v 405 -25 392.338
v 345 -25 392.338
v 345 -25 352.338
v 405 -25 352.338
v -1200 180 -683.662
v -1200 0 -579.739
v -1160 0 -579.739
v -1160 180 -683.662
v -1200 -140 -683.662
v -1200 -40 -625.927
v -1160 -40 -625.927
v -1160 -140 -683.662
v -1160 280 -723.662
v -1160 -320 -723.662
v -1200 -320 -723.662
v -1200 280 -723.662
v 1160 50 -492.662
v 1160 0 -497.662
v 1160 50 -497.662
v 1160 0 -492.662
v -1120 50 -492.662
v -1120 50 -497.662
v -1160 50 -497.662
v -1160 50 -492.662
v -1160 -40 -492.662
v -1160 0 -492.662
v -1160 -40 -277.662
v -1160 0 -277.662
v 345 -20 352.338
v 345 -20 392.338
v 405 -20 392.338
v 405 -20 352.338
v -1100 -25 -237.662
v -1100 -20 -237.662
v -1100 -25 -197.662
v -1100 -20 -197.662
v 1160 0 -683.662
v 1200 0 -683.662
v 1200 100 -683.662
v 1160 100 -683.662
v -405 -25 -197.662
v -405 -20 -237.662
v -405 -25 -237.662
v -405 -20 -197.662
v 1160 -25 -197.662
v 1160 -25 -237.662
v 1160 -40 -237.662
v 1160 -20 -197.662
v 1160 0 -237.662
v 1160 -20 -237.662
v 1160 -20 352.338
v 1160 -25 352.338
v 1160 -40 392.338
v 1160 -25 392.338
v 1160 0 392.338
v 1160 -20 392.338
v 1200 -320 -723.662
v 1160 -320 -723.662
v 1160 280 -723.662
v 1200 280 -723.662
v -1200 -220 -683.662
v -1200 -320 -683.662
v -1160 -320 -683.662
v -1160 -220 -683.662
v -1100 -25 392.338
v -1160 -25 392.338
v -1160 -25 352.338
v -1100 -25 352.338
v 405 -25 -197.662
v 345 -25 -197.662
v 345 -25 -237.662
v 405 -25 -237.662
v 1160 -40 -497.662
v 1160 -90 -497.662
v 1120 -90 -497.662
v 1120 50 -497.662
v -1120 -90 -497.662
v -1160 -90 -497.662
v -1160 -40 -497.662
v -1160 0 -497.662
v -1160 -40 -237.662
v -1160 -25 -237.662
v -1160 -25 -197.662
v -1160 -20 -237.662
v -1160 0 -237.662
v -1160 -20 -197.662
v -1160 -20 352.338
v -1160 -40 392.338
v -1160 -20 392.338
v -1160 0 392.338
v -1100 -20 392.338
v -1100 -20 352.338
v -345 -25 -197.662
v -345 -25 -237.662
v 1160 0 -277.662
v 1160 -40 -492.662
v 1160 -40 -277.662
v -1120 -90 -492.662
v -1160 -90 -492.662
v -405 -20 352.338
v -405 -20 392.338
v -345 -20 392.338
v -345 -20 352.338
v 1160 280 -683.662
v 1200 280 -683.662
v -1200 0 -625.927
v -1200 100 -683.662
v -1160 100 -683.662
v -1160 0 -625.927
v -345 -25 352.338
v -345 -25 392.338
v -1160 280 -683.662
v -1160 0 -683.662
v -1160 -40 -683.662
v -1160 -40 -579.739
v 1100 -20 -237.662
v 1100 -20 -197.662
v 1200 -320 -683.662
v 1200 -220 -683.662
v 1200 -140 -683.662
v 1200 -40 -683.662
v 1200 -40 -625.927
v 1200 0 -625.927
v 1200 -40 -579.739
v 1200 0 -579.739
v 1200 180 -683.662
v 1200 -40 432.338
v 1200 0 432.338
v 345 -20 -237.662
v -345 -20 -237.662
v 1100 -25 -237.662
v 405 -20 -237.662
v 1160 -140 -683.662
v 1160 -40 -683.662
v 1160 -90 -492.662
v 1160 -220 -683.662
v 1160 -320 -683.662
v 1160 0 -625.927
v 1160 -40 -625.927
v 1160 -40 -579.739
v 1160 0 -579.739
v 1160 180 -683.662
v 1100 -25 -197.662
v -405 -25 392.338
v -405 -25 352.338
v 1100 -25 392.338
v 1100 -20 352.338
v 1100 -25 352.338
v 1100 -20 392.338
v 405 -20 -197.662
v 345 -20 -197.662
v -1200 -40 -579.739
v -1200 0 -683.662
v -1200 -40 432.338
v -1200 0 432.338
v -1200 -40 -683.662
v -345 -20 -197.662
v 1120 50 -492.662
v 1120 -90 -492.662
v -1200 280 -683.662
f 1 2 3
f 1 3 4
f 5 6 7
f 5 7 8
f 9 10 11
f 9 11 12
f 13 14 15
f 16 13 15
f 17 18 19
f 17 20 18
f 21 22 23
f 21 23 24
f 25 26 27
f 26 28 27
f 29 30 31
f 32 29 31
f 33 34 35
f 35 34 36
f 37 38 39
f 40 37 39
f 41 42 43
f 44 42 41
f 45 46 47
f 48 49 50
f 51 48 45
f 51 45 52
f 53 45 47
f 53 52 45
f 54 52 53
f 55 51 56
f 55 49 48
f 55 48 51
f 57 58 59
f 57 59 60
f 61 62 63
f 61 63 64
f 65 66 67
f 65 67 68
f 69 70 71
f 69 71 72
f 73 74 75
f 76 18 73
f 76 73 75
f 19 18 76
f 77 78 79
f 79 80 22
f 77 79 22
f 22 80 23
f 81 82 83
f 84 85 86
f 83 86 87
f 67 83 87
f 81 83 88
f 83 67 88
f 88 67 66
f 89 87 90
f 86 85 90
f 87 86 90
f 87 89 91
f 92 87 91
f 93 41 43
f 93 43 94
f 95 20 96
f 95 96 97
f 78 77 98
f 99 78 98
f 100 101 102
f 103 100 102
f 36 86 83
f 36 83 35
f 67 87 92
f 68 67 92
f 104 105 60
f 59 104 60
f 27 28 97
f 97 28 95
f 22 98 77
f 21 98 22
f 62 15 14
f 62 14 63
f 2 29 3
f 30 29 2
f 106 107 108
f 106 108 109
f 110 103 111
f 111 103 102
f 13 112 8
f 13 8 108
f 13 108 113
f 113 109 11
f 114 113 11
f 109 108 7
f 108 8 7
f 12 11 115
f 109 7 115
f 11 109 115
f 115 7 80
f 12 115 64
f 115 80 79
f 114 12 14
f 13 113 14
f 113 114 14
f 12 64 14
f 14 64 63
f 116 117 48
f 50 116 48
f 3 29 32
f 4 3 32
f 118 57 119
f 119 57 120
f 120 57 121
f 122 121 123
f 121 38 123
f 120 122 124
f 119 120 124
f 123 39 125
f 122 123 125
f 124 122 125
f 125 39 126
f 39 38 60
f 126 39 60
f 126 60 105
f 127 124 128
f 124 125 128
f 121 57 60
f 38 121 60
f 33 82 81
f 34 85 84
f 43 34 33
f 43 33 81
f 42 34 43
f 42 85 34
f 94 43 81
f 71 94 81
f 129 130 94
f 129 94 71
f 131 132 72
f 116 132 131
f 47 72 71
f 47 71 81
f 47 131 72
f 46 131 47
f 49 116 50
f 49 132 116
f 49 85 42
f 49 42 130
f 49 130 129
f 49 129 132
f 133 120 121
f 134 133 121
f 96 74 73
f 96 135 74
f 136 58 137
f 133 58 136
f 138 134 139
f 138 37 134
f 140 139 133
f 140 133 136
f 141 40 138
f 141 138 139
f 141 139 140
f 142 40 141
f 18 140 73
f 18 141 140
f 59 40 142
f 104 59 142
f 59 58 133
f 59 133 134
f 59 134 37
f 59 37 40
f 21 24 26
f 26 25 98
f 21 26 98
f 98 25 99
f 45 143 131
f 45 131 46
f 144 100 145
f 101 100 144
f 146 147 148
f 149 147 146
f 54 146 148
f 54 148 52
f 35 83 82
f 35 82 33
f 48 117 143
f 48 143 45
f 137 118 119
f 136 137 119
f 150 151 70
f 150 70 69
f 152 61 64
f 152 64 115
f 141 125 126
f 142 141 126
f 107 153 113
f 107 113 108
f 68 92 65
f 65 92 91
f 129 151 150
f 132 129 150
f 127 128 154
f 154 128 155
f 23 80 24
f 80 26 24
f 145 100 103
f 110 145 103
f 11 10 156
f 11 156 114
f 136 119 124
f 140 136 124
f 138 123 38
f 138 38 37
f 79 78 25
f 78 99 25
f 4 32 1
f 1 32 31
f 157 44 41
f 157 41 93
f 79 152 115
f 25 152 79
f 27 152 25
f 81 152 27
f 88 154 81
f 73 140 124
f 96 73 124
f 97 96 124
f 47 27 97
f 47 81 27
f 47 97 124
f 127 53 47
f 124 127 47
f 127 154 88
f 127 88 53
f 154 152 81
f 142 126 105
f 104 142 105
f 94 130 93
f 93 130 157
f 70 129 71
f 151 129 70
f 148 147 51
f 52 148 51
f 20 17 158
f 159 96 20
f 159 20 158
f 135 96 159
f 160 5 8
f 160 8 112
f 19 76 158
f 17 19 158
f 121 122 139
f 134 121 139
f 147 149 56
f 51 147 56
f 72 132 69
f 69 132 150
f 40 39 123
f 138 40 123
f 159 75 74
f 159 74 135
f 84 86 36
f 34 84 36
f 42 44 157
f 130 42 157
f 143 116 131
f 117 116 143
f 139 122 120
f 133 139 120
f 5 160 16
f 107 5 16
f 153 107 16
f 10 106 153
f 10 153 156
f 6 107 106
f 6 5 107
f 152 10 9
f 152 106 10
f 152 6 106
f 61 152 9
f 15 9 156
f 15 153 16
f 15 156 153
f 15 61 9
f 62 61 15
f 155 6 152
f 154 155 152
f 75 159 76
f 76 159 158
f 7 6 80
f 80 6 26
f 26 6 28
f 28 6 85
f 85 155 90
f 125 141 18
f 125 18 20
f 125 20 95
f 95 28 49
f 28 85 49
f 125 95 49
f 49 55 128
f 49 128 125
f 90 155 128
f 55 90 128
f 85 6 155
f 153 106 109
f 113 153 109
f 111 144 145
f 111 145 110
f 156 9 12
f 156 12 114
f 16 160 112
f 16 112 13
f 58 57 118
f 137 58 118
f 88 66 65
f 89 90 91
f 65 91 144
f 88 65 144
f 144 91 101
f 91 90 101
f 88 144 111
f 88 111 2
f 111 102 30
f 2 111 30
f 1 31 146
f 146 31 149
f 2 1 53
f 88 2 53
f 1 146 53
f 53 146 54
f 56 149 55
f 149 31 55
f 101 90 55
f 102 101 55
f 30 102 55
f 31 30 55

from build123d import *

# Parameters (mm, degrees)
F0_W      = 2320
F0_H      = 630
F0_W_2    = 40
F0_H_2    = 446
F1_DEPTH  = 40
F2_W      = 40
F2_H      = 40
F3_DEPTH  = 40
F4_W      = 50
F4_H      = 5
F4_W_2    = 40
F5_DEPTH  = 40
F9_W      = 60
F9_H      = 40
F10_DEPTH = 5


# Not quite as in the source:
# - a feature names something its author has since deleted; it is built from what else it names


with BuildPart() as f1:
    # F0 (on Front) → F1 (new body)
    with BuildSketch(Plane.XZ):
        Polygon((1200, 432.3376794357), (-1200, 432.3376794357), (-1200, -277.6623205643), (-1160, -277.6623205643), (1160, -277.6623205643), (1200, -277.6623205643), align=None)
        with Locations((0, 77.3376794357)):
            Rectangle(F0_W, F0_H, mode=Mode.SUBTRACT)
        with Locations((1180, -500.6623205643)):
            Rectangle(F0_W_2, F0_H_2)
        with Locations((-1180, -500.6623205643)):
            Rectangle(F0_W_2, F0_H_2)
    extrude(amount=F1_DEPTH)

    # F2 (on face) → F3 (join)
    with BuildSketch(Plane(origin=(-1200, 0, 0), x_dir=(0, -1, 0), z_dir=(-1, 0, 0))):
        Polygon((40, -625.9272936454), (140, -683.6623205643), (220, -683.6623205643), (40, -579.7392721102), align=None)
        Polygon((0, -579.7392721102), (-180, -683.6623205643), (-100, -683.6623205643), (0, -625.9272936454), align=None)
        Polygon((-280, -683.6623205643), (-280, -723.6623205643), (0, -723.6623205643), (0, -683.6623205643), (-100, -683.6623205643), (-180, -683.6623205643), align=None)
        Polygon((40, -683.6623205643), (40, -723.6623205643), (320, -723.6623205643), (320, -683.6623205643), (220, -683.6623205643), (140, -683.6623205643), align=None)
        with Locations((20, -703.6623205643)):
            Rectangle(F2_W, F2_H)
    extrude(amount=-F3_DEPTH)

    # F4 (on face) → F5 (join)
    with BuildSketch(Plane.YZ.offset(-1160)):
        with Locations((25, -495.1623205643)):
            Rectangle(F4_W, F4_H)
        with Locations((-20, -495.1623205643)):
            Rectangle(F4_W_2, F4_H)
        with Locations((-65, -495.1623205643)):
            Rectangle(F4_W, F4_H)
    extrude(amount=F5_DEPTH)

    # F6: F1 across plane


with BuildPart() as f1_1:
    add(f1.part)
    add(f1.part.mirror(Plane.YZ))

    # F7: F1 across plane


with BuildPart() as f1_2:
    add(f1_1.part)
    add(f1_1.part.mirror(Plane.YZ))

    # F9 (on offset) → F10 (join)
    with BuildSketch(Plane.XZ.offset(20)):
        with Locations((-1130, -217.6623205643)):
            Rectangle(F9_W, F9_H)
        with Locations((-1130, 372.3376794357)):
            Rectangle(F9_W, F9_H)
        with Locations((-375, 372.3376794357)):
            Rectangle(F9_W, F9_H)
        with Locations((-375, -217.6623205643)):
            Rectangle(F9_W, F9_H)
        with Locations((375, -217.6623205643)):
            Rectangle(F9_W, F9_H)
        with Locations((375, 372.3376794357)):
            Rectangle(F9_W, F9_H)
        with Locations((1130, 372.3376794357)):
            Rectangle(F9_W, F9_H)
        with Locations((1130, -217.6623205643)):
            Rectangle(F9_W, F9_H)
    extrude(amount=F10_DEPTH)


solid = f1_2.part
